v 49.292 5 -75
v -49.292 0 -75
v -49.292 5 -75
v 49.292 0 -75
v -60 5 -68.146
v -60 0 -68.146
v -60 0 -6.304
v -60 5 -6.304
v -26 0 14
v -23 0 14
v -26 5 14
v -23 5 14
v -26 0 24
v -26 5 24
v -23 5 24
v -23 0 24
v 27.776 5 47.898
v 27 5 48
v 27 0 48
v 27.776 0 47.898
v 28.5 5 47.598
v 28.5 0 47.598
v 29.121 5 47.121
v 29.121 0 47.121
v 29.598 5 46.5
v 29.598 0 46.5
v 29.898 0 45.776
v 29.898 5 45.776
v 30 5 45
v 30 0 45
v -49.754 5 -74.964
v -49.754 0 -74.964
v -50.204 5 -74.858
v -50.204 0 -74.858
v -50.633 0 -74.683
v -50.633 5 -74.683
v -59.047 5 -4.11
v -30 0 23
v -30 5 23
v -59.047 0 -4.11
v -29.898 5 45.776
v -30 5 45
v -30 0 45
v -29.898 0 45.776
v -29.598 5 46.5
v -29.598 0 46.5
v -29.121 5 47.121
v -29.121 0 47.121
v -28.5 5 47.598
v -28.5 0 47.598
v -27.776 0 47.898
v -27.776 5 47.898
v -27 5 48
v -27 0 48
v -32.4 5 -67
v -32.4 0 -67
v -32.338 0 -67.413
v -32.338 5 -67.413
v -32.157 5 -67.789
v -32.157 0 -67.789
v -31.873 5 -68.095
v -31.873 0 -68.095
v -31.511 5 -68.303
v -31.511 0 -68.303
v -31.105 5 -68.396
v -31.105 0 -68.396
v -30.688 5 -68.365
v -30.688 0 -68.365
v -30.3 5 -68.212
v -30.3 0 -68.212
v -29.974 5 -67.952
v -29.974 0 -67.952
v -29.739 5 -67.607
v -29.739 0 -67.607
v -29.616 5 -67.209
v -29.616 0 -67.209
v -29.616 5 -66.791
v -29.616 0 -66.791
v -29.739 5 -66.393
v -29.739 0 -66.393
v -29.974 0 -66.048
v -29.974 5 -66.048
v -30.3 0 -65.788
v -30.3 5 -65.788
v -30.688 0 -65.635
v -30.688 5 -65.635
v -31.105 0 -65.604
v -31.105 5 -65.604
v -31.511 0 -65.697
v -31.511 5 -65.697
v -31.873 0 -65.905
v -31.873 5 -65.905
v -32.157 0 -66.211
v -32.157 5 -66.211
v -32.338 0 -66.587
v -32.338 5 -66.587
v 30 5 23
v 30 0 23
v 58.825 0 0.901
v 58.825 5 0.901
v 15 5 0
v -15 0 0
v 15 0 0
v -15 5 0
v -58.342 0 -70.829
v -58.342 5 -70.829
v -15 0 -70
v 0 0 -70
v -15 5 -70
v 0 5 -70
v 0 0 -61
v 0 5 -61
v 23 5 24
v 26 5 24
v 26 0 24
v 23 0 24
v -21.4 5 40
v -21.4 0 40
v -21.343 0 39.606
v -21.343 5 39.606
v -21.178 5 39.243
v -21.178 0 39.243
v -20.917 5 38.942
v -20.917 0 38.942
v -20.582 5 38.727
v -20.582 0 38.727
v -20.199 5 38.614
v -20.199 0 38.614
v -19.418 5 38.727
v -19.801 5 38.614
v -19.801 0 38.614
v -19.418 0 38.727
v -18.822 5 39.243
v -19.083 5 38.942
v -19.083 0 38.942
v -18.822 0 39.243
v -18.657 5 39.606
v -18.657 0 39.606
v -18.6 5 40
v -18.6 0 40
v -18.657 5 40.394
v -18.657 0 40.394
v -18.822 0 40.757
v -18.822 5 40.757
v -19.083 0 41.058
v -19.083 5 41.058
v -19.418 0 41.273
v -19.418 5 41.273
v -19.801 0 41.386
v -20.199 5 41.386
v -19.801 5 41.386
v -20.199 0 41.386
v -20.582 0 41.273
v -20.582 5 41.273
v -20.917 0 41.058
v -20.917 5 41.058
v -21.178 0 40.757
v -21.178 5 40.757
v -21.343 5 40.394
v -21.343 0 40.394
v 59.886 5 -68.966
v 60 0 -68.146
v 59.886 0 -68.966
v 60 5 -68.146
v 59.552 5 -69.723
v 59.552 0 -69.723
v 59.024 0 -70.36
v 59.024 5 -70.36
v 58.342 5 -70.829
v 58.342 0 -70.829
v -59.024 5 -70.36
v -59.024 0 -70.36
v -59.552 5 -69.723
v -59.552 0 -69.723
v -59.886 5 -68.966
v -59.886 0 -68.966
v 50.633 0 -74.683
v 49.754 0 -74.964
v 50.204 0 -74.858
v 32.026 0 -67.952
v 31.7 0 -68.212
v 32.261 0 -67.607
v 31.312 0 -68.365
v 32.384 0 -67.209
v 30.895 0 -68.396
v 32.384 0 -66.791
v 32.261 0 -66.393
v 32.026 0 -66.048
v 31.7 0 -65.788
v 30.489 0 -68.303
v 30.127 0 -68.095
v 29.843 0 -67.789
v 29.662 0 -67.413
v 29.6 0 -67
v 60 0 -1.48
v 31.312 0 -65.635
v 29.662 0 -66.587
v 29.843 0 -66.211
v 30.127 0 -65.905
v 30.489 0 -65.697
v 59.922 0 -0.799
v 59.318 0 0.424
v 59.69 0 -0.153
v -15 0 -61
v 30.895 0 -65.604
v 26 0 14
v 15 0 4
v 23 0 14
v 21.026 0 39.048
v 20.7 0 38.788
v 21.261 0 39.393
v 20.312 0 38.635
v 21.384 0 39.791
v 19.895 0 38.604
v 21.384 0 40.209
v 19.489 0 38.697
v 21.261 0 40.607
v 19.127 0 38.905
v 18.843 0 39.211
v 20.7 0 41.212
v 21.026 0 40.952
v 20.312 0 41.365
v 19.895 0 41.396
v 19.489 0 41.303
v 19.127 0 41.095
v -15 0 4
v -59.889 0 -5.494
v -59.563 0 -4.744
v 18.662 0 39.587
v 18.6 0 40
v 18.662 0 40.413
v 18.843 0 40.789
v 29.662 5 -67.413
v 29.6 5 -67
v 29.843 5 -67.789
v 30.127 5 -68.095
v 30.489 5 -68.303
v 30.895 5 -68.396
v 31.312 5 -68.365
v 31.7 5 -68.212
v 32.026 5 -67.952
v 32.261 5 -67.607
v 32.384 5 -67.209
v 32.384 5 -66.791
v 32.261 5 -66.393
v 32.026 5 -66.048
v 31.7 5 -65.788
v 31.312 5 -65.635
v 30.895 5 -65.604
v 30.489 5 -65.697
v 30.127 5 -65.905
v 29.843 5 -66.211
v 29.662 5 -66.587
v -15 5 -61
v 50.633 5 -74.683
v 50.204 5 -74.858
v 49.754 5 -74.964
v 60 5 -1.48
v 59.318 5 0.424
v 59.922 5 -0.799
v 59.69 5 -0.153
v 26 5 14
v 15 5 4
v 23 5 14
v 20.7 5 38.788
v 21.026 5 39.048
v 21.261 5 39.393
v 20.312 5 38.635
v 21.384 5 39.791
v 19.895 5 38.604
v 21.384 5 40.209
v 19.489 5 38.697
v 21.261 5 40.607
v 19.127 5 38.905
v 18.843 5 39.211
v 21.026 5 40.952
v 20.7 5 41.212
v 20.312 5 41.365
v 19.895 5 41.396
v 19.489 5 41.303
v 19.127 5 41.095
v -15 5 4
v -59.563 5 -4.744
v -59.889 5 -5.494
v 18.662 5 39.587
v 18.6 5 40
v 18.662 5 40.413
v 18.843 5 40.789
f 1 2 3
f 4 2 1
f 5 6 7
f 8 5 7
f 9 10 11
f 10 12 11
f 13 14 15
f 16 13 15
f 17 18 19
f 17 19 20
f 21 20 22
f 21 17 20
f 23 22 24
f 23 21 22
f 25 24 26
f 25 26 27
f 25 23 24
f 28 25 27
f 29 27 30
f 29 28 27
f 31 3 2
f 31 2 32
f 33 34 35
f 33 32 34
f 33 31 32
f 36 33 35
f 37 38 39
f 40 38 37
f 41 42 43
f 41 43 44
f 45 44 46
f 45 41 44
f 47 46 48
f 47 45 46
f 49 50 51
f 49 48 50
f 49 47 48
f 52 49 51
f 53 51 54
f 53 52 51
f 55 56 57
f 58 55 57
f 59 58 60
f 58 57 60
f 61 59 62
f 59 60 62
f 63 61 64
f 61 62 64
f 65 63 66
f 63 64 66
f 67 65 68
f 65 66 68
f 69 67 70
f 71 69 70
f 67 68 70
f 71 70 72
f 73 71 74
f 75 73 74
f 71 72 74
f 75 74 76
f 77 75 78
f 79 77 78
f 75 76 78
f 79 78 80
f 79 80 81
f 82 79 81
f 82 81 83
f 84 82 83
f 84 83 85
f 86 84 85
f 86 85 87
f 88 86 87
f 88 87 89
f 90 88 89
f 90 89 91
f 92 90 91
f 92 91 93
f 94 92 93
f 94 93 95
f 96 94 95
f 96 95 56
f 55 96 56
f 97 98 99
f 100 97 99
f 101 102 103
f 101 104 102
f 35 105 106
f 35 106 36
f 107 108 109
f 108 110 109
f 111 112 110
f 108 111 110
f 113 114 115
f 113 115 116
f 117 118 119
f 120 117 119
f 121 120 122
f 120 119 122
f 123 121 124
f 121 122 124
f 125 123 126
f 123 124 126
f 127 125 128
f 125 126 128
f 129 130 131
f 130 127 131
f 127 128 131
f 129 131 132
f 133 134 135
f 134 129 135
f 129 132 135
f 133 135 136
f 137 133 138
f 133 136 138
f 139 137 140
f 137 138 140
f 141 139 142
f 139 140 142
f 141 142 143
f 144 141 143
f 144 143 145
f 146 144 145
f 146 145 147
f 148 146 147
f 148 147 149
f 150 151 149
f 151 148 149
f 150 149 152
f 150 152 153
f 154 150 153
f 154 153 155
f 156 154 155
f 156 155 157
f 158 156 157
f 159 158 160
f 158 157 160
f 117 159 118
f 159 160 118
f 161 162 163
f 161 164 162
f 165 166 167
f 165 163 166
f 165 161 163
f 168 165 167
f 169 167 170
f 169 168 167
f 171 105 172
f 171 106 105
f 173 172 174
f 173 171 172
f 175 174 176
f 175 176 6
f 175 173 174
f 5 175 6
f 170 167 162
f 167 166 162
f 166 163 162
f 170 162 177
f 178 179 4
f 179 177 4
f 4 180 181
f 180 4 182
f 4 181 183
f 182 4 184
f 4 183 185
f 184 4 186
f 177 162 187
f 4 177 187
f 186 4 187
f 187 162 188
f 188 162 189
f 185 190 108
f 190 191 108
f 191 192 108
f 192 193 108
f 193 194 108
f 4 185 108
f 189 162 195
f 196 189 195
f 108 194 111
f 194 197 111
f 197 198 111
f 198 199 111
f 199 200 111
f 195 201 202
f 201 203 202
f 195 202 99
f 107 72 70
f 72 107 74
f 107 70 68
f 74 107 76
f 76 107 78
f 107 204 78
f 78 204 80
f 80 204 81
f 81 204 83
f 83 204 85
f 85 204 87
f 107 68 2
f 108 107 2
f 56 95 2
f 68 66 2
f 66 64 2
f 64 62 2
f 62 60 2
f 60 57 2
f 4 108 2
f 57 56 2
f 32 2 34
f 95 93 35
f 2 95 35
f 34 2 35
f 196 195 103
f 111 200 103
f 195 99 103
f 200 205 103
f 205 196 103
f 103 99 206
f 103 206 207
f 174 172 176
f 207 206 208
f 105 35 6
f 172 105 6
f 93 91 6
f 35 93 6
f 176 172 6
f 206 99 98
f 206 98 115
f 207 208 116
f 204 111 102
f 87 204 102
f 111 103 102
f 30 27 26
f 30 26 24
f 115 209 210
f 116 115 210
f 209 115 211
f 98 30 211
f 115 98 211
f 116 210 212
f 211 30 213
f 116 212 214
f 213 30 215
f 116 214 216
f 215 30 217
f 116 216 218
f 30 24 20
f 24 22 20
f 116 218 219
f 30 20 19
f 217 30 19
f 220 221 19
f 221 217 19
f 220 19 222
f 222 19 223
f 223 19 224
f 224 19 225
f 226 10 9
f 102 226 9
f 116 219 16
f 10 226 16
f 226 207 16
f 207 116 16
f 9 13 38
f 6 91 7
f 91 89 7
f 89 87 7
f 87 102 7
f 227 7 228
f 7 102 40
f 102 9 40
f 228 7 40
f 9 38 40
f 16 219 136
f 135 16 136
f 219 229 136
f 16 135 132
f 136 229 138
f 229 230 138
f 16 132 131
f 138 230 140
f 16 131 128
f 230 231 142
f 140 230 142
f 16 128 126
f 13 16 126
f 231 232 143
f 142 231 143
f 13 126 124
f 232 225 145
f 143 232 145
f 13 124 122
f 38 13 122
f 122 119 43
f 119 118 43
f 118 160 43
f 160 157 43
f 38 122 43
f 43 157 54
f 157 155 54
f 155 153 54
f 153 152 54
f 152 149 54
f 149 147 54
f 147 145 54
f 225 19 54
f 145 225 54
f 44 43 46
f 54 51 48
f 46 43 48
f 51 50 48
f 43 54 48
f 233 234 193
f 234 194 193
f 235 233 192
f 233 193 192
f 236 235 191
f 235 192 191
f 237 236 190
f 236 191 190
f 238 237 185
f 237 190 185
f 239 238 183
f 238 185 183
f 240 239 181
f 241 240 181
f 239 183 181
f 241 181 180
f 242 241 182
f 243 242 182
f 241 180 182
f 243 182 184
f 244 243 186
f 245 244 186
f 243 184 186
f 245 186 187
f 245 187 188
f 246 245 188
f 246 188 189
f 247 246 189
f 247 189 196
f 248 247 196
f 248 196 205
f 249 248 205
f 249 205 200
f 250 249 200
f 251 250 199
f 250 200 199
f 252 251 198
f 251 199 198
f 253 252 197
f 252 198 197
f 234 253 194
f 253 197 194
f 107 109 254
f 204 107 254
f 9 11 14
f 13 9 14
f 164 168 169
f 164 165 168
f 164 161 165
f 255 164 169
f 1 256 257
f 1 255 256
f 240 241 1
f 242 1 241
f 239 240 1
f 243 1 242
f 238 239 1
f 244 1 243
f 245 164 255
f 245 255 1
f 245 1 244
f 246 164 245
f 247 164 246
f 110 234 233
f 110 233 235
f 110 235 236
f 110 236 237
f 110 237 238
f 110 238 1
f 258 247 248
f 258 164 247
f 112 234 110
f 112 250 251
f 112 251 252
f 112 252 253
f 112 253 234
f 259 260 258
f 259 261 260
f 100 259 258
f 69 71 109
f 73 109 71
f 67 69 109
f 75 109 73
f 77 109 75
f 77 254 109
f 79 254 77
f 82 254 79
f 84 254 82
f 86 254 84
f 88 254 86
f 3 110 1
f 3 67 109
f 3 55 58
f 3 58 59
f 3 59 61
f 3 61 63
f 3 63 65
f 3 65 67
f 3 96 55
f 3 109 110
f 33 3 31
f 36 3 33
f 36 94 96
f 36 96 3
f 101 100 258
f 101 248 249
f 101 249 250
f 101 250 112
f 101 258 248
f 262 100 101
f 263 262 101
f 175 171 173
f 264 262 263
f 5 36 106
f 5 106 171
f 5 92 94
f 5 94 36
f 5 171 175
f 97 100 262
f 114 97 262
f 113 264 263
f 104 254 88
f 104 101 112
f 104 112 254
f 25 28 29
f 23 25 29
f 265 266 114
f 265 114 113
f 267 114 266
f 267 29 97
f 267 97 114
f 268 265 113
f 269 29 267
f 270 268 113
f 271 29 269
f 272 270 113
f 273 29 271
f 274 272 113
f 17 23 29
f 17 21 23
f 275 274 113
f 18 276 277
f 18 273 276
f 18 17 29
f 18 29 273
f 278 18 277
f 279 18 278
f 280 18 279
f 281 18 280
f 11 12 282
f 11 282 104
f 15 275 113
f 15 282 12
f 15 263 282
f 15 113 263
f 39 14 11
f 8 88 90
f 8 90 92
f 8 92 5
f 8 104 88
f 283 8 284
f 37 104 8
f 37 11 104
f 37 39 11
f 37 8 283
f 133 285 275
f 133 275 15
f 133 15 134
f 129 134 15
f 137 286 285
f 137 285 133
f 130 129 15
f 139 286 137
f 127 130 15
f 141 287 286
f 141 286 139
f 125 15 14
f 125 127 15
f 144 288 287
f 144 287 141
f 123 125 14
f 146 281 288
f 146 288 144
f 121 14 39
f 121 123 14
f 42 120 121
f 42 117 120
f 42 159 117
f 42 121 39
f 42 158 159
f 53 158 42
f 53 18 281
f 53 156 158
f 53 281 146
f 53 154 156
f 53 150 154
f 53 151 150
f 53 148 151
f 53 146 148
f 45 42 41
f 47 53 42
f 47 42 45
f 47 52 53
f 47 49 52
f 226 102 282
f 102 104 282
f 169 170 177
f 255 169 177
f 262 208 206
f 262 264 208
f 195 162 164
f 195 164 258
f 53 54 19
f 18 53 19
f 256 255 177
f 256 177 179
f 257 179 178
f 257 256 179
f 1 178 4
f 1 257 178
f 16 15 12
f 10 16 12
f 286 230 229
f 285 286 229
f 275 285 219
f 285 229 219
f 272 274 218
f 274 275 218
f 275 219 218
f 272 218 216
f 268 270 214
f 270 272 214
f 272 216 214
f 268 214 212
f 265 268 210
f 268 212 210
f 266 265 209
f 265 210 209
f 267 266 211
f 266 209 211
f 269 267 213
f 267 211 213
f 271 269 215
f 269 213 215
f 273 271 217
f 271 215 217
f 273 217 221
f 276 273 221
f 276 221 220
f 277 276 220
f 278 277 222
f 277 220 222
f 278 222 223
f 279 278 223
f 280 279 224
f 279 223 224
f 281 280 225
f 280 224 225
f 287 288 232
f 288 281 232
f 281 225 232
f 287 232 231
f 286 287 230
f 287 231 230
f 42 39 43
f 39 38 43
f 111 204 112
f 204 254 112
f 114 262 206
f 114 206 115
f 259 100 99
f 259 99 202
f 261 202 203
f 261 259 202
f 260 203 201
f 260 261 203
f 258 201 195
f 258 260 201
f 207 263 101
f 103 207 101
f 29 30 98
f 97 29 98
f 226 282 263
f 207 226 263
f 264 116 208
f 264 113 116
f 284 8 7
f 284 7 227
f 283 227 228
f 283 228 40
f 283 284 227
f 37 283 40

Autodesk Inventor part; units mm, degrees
ref_plane "YZ Plane" through (0, 0, 0) normal (1, 0, 0) x (0, 1, 0)
ref_plane "XZ Plane" through (0, 0, 0) normal (0, 1, 0) x (-1, 0, 0)
ref_plane "XY Plane" through (0, 0, 0) normal (0, 0, 1) x (1, 0, 0)
sketch "Sketch1" plane through (0, 0, 0) normal (0, 1, 0) x (-1, 0, 0)
  line L0 (60, -75) -> (-60, -75)
  line L1 (-60, 75) -> (60, -75) construction
  line L2 (60, 75) -> (-60, -75) construction
  line L3 (-60, -75) -> (-60, -55)
  line L4 (-60, -42.5) -> (-60, -55)
  line L5 (0, 75) -> (0, 40)
  line L6 (-60, -75) -> (-60, -5)
  line L7 (-30, 40) -> (-30, 10)
  line L8 (-30, 10) -> (-60, 0)
  line L9 (30, 40) -> (30, 10)
  line L10 (30, 10) -> (60, -5)
  line L11 (-30, 40) -> (-30, 48)
  line L12 (30, 40) -> (30, 48)
  line L13 (0, 75) -> (0, -75)
  line L14 (0, -75) -> (-60, -75)
  line L15 (60, -70) -> (60, -55)
  line L16 (60, -42.5) -> (60, -55)
  line L17 (60, -5) -> (60, -70)
  line L18 (-60, -75) -> (-60, 0)
  line L19 (57, -75) -> (50, -75)
  line L20 (60, -70) -> (60, -75)
  line L21 (-60, -75) -> (-50, -75)
  line L22 (-60, -70) -> (-60, -75)
  line L23 (-60, -70) -> (-50, -75)
  line L24 (60, -70) -> (50, -75)
  line L25 (-27.5, -75) -> (27.5, -75)
  line L26 (27.5, -75) -> (27.5, -5)
  line L27 (27.5, -5) -> (-27.5, -5)
  line L28 (-27.5, -5) -> (-27.5, -75)
  line L29 (30, 10) -> (-30, 10)
  line L30 (0, 75) -> (0, 40)
  line L31 (0, 40) -> (20, 40)
  line L32 (20, 40) -> (-20, 40)
  circle A0 centre (20, 40) radius 1.4
  circle A1 centre (-20, 40) radius 1.4
  line L33 (30, 48) -> (-30, 48)
  line L34 (-60, -75) -> (-35, -75)
  line L35 (60, -75) -> (35, -75)
  line L36 (35, -75) -> (31, -75)
  line L37 (31, -75) -> (31, -67)
  line L38 (31, -67) -> (35, -67)
  line L39 (35, -67) -> (35, -75)
  line L40 (-35, -75) -> (-39, -75)
  line L41 (-39, -75) -> (-39, -67)
  line L42 (-39, -67) -> (-35, -67)
  line L43 (-35, -67) -> (-35, -75)
  circle A2 centre (-35, -67) radius 1.4
  circle A3 centre (31, -67) radius 1.4
  line L44 (30, 48) -> (30, 23)
  line L45 (30, 23) -> (60, -5)
  line L46 (-30, 48) -> (-30, 23)
  line L47 (-30, 23) -> (-60, 0)
  line L48 (-35, -75) -> (-31, -75)
  line L49 (-31, -75) -> (-31, -67)
  line L50 (-31, -67) -> (-35, -67)
  line L51 (-35, -67) -> (-35, -75)
  circle A4 centre (-31, -67) radius 1.4
  dimension "d0" = 120
  dimension "d1" = 150
  dimension "d18" = 70
  dimension "d43" = 55
  dimension "d44" = 70
  dimension "d45" = 35
  dimension "d46" = 20
  dimension "d47" = 40
  dimension "d48" = 2.8
  dimension "d49" = 2.8
  dimension "d50" = 25
  dimension "d51" = 25
  dimension "d52" = 4
  dimension "d53" = 8
  dimension "d54" = 4
  dimension "d55" = 8
  dimension "d56" = 2.8
  dimension "d57" = 2.8
  dimension "d73" = 25
  dimension "d74" = 25
  dimension "d86" = 4
  dimension "d87" = 2.8
extrude "Extrusion1" add sketch "Sketch1" along normal blind 5 contours L24 L0 L39 L38 A3 L37 L26 L27 L13 L29 L10 L17 L16 L15 | L0 L37 A3 L38 L39 | L10 L9 L45 | L0 L13 L27 L26 | L29 L13 L5 L33 L12 L9 | L0 L28 L27 L13 | L29 L7 L11 L33 L5 L13 | L13 L27 L28 L0 L49 A4 L50 A2 L42 L41 L23 L3 L4 L6 L18 L8 L29 | L8 L47 L7 | L0 L43 A2 L50 A4 L49 | L0 L41 L42 A2 L43 | A2 L42 L43 | L43 L50 A2 | L42 A2 L50
fillet "Fillet1" radius 3 8 edges at (30, 2.5, 48) (60, 2.5, 0) (50, 2.5, -75) (60, 2.5, -70) (-60, 2.5, -70) (-50, 2.5, -75) (-60, 2.5, -5) (-30, 2.5, 48)
sketch "Sketch2" plane through (0, 5, 0) normal (0, 1, 0) x (1, 0, 0)
  line L0 (49.2918, 75) -> (-49.2918, 75) construction
  line L1 (0, 75) -> (0, 65) construction
  line L2 (0, 65) -> (30, 65) construction
  circle A0 centre (30, 65) radius 3
  line L3 (0, 75) -> (0, 70)
  line L4 (0, 75) -> (5, 75) construction
  line L5 (0, 58) -> (0, 70)
  line L6 (0, 70) -> (-15, 70)
  line L7 (-15, 70) -> (-15, 61)
  line L8 (-15, 61) -> (0, 61)
  line L9 (0, 61) -> (0, 70)
  line L10 (0, 61) -> (0, -4)
  line L11 (0, -4) -> (-23, -4)
  line L12 (-23, -4) -> (23, -4)
  line L13 (-23, -4) -> (-26, -4)
  line L14 (-26, -4) -> (-26, -24)
  line L15 (-26, -24) -> (-23, -24)
  line L16 (-23, -24) -> (-23, -4)
  line L17 (23, -4) -> (26, -4)
  line L18 (26, -4) -> (26, -24)
  line L19 (26, -24) -> (23, -24)
  line L20 (23, -24) -> (23, -4)
  line L21 (-26, -24) -> (-23, -24)
  line L22 (-23, -24) -> (-23, -14)
  line L23 (-23, -14) -> (-26, -14)
  line L24 (-26, -14) -> (-26, -24)
  line L25 (26, -24) -> (23, -24)
  line L26 (23, -24) -> (23, -14)
  line L27 (23, -14) -> (26, -14)
  line L28 (26, -14) -> (26, -24)
  line L29 (23, -4) -> (-23, -4)
  line L30 (-23, -4) -> (-23, 0)
  line L31 (-23, 0) -> (23, 0)
  line L32 (23, 0) -> (23, -4)
  line L33 (15, 0) -> (-15, 0)
  line L34 (-15, 0) -> (-15, -4)
  line L35 (-15, -4) -> (15, -4)
  line L36 (15, -4) -> (15, 0)
  line L37 (15, 0) -> (-15, -4) construction
  line L38 (-15, 0) -> (15, -4) construction
  point P0 (0, 0)
  point P1 (0, -2)
  dimension "d61" = 10
  dimension "d62" = 30
  dimension "d63" = 6
  dimension "d64" = 5
  dimension "d65" = 90
  dimension "d68" = 15
  dimension "d69" = 9
  dimension "d76" = 65
  dimension "d77" = 23
  dimension "d78" = 46
  dimension "d79" = 3
  dimension "d80" = 20
  dimension "d81" = 3
  dimension "d82" = 20
  dimension "d83" = 10
  dimension "d84" = 10
  dimension "d85" = 30
extrude "Extrusion2" cut sketch "Sketch2" against normal through all contours L8 L7 L6 L5 | L31 L36 L12 L10 | L10 L11 L34 L31 | L16 L15 L14 L23 | L27 L18 L19 L20
properties part number "DeTren"
